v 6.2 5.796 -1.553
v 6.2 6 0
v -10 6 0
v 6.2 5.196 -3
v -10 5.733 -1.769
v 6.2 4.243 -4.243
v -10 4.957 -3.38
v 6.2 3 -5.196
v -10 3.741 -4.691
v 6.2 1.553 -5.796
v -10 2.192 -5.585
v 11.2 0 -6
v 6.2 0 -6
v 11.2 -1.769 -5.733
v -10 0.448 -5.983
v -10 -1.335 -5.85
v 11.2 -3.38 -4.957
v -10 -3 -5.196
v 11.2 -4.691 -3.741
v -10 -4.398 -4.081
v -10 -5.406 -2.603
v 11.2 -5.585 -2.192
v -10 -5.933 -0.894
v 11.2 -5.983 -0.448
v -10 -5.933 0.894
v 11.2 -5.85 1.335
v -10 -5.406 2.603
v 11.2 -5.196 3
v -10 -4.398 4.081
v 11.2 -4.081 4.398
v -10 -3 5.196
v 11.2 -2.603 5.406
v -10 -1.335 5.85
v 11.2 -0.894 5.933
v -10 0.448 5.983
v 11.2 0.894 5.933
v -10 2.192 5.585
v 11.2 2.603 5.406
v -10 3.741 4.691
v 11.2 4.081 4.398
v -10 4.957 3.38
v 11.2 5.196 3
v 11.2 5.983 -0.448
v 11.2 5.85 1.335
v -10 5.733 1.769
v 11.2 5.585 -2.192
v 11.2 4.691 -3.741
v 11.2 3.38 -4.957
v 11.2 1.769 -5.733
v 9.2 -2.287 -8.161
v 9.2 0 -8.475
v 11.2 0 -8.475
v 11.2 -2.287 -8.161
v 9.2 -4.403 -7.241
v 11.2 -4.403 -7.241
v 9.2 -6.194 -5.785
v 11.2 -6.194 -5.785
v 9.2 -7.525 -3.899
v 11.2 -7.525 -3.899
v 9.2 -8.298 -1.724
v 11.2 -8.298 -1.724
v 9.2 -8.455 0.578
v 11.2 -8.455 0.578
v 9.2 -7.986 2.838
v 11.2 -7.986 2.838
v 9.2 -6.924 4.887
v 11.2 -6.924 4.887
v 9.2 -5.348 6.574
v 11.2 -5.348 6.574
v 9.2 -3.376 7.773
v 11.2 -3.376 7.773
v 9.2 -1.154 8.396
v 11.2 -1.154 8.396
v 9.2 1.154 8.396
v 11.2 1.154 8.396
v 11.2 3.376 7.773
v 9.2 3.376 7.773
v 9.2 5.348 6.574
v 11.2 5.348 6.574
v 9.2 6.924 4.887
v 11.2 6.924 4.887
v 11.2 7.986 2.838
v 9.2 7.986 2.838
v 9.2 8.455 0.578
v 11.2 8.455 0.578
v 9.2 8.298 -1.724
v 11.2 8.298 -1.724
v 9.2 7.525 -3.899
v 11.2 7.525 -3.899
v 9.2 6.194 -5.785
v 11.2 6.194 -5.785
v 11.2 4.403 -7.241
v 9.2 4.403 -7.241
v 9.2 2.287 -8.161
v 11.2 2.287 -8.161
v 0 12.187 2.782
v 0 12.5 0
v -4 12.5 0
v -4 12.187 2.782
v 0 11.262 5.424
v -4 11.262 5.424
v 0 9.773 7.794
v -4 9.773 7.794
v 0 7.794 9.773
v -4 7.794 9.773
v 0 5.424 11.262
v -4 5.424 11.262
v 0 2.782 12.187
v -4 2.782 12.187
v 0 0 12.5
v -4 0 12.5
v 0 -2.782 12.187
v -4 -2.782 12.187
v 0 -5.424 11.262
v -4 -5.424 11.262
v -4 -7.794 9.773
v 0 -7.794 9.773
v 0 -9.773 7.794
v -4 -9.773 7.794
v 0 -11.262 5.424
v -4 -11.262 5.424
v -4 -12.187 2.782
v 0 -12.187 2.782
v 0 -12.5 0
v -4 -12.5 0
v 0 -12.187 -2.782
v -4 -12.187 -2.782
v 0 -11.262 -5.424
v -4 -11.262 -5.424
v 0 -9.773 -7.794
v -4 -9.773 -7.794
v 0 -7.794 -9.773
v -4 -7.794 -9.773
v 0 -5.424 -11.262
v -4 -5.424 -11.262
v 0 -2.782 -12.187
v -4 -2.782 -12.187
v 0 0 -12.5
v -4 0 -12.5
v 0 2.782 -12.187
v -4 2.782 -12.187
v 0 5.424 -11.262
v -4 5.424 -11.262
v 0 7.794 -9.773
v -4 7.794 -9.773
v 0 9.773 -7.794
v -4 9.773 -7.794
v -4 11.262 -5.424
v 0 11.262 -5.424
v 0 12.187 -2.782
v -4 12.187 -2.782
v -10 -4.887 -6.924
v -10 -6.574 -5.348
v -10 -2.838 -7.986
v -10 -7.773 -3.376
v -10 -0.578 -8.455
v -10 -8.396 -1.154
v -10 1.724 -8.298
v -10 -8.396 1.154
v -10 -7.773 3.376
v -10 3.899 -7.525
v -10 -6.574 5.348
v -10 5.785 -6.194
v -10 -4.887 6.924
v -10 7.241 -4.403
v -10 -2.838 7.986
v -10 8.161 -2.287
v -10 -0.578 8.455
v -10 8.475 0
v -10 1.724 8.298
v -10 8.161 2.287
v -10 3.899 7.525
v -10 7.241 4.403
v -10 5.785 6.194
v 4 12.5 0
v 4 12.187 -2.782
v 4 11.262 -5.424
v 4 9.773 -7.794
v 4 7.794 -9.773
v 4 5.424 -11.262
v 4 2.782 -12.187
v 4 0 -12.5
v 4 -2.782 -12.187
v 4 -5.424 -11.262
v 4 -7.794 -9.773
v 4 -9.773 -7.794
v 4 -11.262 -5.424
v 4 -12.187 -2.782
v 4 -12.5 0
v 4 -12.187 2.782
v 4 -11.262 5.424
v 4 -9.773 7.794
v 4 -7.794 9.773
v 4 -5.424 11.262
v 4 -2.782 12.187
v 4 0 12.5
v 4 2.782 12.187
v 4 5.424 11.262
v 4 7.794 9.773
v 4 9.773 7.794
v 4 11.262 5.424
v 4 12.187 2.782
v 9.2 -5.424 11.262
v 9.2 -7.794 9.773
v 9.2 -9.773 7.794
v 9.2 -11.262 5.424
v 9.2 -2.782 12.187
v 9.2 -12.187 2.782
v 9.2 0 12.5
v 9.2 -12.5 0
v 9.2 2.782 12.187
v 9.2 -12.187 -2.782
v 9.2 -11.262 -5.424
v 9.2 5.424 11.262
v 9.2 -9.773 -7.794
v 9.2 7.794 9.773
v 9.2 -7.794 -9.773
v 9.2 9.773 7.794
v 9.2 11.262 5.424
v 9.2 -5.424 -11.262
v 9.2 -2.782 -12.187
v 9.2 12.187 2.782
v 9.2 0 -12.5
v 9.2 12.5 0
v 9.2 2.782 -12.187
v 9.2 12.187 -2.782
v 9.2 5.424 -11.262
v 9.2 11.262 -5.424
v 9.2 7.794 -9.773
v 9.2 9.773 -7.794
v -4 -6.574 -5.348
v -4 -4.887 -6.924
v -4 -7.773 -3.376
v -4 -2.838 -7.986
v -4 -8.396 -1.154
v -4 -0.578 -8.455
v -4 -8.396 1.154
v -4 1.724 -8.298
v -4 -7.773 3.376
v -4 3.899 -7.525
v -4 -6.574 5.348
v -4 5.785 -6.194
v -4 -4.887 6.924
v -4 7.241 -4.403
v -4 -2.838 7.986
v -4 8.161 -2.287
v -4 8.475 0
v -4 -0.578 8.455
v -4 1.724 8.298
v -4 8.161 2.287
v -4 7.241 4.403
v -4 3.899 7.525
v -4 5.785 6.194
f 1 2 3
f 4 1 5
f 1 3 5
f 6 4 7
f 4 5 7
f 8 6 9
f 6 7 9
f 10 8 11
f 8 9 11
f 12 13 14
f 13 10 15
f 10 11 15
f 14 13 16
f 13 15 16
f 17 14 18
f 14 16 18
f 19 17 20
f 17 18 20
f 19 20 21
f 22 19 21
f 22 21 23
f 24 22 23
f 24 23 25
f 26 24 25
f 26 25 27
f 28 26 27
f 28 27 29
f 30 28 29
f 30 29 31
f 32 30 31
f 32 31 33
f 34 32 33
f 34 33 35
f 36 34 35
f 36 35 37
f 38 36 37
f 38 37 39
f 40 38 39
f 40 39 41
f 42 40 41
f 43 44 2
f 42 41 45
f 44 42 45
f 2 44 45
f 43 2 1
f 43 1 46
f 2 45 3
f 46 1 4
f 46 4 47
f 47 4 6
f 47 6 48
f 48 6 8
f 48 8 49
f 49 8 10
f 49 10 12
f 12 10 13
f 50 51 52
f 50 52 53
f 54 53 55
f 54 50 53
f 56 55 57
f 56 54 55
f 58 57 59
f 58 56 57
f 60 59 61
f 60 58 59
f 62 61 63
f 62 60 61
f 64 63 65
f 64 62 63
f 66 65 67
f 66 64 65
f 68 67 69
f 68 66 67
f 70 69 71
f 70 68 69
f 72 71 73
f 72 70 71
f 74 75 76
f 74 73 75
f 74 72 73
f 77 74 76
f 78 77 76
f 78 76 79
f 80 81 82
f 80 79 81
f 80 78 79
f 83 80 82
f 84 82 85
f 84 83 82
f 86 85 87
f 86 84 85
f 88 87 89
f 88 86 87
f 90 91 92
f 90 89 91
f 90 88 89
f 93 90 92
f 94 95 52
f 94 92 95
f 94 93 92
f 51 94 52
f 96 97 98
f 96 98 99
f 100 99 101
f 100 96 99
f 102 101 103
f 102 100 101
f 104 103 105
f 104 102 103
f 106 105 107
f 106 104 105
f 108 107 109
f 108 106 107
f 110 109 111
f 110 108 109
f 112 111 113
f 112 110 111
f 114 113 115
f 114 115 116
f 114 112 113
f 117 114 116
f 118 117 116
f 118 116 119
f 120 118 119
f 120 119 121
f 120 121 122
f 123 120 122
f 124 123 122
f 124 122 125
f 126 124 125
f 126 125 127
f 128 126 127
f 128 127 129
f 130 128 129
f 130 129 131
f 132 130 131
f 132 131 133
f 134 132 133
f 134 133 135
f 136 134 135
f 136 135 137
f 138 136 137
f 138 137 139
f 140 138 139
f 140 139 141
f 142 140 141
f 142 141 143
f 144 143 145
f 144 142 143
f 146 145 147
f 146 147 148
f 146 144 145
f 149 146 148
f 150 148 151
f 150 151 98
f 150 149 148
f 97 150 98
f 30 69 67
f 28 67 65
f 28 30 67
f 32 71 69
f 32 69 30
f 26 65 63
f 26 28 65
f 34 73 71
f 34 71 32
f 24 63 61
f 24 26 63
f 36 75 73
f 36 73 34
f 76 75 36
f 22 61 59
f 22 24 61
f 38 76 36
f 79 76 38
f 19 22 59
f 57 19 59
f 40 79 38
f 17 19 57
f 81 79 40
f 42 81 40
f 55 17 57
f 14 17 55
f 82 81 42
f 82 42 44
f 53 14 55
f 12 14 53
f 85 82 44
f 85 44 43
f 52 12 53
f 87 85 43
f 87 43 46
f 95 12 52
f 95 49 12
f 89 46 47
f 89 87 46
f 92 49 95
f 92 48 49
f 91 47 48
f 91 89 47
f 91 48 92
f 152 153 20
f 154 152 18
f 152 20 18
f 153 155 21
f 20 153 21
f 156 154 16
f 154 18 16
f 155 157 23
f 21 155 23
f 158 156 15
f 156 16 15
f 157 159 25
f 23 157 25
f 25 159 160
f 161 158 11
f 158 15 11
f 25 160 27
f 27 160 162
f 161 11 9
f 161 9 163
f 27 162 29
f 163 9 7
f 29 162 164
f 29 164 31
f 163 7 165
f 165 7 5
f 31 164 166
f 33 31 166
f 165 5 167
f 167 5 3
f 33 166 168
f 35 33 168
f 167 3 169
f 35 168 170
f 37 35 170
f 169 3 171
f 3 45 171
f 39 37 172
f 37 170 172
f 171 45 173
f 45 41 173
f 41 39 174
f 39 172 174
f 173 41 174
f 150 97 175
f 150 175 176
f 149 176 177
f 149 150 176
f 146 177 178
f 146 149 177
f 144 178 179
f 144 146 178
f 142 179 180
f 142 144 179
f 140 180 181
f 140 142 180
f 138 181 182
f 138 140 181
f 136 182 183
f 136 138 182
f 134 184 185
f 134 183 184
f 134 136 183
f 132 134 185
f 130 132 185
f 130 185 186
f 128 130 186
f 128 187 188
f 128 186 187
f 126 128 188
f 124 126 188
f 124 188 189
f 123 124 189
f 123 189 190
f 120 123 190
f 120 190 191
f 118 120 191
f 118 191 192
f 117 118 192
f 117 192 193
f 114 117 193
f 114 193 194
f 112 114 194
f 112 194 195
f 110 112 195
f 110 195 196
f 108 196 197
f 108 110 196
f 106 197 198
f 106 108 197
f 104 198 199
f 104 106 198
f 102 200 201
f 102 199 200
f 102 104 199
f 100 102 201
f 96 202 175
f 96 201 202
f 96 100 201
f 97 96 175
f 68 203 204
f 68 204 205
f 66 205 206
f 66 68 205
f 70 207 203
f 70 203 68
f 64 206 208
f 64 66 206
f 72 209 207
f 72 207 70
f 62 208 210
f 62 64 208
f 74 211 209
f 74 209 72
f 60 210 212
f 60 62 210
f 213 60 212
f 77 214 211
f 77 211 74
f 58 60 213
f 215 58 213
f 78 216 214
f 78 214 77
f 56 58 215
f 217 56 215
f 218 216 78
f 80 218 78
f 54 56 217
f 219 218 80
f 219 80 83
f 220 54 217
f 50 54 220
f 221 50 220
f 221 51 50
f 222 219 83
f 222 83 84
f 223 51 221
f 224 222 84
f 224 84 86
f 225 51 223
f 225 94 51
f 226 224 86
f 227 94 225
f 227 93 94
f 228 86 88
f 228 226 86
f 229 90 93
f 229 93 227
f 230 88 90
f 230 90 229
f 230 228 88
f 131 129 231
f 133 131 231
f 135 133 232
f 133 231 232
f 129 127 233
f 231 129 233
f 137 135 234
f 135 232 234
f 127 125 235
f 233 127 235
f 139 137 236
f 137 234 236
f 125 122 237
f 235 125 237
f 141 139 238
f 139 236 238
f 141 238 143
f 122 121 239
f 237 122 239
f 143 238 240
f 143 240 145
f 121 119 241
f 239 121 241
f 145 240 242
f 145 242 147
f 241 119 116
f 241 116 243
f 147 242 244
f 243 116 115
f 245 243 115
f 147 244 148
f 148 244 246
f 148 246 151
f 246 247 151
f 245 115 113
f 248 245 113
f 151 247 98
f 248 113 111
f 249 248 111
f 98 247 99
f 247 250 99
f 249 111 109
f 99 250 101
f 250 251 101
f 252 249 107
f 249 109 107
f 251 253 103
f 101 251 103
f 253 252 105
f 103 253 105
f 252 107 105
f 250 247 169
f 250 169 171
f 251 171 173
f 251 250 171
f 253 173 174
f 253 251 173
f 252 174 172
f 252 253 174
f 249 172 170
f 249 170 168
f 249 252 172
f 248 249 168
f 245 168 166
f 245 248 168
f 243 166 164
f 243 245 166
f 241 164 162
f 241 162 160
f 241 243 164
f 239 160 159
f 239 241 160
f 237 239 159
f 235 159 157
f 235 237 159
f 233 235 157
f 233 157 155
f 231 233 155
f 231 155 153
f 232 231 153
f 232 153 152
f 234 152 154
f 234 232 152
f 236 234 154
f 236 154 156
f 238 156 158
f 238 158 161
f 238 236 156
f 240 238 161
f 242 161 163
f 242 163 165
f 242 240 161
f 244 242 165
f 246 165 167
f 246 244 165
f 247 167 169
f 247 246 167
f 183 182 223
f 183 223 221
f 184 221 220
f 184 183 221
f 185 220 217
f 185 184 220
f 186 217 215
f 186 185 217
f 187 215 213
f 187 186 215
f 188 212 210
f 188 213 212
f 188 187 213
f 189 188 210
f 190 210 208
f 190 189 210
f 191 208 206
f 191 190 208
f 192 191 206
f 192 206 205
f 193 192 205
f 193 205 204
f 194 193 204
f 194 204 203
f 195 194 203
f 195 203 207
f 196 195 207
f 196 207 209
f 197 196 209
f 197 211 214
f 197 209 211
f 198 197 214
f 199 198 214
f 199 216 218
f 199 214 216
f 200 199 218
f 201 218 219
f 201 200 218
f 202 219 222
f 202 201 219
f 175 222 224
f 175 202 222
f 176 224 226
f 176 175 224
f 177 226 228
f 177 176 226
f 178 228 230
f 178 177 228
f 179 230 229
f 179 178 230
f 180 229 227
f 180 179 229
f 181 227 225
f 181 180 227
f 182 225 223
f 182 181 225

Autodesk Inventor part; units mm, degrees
ref_plane "YZ Plane" through (0, 0, 0) normal (1, 0, 0) x (0, 1, 0)
ref_plane "XZ Plane" through (0, 0, 0) normal (0, 1, 0) x (-1, 0, 0)
ref_plane "XY Plane" through (0, 0, 0) normal (0, 0, 1) x (1, 0, 0)
sketch "Boceto6" plane through (0, 0, 0) normal (1, 0, 0) x (0, 1, 0)
  circle A0 centre (0, 0) radius 6
  circle A1 centre (0, 0) radius 12.5
  circle A2 centre (0, 0) radius 8.475
  dimension "d16" = 12
  dimension "d17" = 25
  dimension "d18" = 16.95
extrude "Extrusión6" add sketch "Boceto6" along normal blind 4 and the other way blind 4 contours A1
extrude "Extrusión7" add sketch "Boceto6" along normal blind 6.2 and the other way blind 10 contours A2
sketch "Boceto7" plane through (4, 0, 0) normal (1, 0, 0) x (0, 0, -1)
  circle A0 centre (0, 0) radius 6
  circle A1 centre (0, 0) radius 8.475
  circle A2 centre (0, 0) radius 12.5
extrude "Extrusión8" add sketch "Boceto7" along normal blind 5.2 contours A2
extrude "Extrusión9" add sketch "Boceto7" along normal blind 7.2 contours A1
properties part number "Buge"
